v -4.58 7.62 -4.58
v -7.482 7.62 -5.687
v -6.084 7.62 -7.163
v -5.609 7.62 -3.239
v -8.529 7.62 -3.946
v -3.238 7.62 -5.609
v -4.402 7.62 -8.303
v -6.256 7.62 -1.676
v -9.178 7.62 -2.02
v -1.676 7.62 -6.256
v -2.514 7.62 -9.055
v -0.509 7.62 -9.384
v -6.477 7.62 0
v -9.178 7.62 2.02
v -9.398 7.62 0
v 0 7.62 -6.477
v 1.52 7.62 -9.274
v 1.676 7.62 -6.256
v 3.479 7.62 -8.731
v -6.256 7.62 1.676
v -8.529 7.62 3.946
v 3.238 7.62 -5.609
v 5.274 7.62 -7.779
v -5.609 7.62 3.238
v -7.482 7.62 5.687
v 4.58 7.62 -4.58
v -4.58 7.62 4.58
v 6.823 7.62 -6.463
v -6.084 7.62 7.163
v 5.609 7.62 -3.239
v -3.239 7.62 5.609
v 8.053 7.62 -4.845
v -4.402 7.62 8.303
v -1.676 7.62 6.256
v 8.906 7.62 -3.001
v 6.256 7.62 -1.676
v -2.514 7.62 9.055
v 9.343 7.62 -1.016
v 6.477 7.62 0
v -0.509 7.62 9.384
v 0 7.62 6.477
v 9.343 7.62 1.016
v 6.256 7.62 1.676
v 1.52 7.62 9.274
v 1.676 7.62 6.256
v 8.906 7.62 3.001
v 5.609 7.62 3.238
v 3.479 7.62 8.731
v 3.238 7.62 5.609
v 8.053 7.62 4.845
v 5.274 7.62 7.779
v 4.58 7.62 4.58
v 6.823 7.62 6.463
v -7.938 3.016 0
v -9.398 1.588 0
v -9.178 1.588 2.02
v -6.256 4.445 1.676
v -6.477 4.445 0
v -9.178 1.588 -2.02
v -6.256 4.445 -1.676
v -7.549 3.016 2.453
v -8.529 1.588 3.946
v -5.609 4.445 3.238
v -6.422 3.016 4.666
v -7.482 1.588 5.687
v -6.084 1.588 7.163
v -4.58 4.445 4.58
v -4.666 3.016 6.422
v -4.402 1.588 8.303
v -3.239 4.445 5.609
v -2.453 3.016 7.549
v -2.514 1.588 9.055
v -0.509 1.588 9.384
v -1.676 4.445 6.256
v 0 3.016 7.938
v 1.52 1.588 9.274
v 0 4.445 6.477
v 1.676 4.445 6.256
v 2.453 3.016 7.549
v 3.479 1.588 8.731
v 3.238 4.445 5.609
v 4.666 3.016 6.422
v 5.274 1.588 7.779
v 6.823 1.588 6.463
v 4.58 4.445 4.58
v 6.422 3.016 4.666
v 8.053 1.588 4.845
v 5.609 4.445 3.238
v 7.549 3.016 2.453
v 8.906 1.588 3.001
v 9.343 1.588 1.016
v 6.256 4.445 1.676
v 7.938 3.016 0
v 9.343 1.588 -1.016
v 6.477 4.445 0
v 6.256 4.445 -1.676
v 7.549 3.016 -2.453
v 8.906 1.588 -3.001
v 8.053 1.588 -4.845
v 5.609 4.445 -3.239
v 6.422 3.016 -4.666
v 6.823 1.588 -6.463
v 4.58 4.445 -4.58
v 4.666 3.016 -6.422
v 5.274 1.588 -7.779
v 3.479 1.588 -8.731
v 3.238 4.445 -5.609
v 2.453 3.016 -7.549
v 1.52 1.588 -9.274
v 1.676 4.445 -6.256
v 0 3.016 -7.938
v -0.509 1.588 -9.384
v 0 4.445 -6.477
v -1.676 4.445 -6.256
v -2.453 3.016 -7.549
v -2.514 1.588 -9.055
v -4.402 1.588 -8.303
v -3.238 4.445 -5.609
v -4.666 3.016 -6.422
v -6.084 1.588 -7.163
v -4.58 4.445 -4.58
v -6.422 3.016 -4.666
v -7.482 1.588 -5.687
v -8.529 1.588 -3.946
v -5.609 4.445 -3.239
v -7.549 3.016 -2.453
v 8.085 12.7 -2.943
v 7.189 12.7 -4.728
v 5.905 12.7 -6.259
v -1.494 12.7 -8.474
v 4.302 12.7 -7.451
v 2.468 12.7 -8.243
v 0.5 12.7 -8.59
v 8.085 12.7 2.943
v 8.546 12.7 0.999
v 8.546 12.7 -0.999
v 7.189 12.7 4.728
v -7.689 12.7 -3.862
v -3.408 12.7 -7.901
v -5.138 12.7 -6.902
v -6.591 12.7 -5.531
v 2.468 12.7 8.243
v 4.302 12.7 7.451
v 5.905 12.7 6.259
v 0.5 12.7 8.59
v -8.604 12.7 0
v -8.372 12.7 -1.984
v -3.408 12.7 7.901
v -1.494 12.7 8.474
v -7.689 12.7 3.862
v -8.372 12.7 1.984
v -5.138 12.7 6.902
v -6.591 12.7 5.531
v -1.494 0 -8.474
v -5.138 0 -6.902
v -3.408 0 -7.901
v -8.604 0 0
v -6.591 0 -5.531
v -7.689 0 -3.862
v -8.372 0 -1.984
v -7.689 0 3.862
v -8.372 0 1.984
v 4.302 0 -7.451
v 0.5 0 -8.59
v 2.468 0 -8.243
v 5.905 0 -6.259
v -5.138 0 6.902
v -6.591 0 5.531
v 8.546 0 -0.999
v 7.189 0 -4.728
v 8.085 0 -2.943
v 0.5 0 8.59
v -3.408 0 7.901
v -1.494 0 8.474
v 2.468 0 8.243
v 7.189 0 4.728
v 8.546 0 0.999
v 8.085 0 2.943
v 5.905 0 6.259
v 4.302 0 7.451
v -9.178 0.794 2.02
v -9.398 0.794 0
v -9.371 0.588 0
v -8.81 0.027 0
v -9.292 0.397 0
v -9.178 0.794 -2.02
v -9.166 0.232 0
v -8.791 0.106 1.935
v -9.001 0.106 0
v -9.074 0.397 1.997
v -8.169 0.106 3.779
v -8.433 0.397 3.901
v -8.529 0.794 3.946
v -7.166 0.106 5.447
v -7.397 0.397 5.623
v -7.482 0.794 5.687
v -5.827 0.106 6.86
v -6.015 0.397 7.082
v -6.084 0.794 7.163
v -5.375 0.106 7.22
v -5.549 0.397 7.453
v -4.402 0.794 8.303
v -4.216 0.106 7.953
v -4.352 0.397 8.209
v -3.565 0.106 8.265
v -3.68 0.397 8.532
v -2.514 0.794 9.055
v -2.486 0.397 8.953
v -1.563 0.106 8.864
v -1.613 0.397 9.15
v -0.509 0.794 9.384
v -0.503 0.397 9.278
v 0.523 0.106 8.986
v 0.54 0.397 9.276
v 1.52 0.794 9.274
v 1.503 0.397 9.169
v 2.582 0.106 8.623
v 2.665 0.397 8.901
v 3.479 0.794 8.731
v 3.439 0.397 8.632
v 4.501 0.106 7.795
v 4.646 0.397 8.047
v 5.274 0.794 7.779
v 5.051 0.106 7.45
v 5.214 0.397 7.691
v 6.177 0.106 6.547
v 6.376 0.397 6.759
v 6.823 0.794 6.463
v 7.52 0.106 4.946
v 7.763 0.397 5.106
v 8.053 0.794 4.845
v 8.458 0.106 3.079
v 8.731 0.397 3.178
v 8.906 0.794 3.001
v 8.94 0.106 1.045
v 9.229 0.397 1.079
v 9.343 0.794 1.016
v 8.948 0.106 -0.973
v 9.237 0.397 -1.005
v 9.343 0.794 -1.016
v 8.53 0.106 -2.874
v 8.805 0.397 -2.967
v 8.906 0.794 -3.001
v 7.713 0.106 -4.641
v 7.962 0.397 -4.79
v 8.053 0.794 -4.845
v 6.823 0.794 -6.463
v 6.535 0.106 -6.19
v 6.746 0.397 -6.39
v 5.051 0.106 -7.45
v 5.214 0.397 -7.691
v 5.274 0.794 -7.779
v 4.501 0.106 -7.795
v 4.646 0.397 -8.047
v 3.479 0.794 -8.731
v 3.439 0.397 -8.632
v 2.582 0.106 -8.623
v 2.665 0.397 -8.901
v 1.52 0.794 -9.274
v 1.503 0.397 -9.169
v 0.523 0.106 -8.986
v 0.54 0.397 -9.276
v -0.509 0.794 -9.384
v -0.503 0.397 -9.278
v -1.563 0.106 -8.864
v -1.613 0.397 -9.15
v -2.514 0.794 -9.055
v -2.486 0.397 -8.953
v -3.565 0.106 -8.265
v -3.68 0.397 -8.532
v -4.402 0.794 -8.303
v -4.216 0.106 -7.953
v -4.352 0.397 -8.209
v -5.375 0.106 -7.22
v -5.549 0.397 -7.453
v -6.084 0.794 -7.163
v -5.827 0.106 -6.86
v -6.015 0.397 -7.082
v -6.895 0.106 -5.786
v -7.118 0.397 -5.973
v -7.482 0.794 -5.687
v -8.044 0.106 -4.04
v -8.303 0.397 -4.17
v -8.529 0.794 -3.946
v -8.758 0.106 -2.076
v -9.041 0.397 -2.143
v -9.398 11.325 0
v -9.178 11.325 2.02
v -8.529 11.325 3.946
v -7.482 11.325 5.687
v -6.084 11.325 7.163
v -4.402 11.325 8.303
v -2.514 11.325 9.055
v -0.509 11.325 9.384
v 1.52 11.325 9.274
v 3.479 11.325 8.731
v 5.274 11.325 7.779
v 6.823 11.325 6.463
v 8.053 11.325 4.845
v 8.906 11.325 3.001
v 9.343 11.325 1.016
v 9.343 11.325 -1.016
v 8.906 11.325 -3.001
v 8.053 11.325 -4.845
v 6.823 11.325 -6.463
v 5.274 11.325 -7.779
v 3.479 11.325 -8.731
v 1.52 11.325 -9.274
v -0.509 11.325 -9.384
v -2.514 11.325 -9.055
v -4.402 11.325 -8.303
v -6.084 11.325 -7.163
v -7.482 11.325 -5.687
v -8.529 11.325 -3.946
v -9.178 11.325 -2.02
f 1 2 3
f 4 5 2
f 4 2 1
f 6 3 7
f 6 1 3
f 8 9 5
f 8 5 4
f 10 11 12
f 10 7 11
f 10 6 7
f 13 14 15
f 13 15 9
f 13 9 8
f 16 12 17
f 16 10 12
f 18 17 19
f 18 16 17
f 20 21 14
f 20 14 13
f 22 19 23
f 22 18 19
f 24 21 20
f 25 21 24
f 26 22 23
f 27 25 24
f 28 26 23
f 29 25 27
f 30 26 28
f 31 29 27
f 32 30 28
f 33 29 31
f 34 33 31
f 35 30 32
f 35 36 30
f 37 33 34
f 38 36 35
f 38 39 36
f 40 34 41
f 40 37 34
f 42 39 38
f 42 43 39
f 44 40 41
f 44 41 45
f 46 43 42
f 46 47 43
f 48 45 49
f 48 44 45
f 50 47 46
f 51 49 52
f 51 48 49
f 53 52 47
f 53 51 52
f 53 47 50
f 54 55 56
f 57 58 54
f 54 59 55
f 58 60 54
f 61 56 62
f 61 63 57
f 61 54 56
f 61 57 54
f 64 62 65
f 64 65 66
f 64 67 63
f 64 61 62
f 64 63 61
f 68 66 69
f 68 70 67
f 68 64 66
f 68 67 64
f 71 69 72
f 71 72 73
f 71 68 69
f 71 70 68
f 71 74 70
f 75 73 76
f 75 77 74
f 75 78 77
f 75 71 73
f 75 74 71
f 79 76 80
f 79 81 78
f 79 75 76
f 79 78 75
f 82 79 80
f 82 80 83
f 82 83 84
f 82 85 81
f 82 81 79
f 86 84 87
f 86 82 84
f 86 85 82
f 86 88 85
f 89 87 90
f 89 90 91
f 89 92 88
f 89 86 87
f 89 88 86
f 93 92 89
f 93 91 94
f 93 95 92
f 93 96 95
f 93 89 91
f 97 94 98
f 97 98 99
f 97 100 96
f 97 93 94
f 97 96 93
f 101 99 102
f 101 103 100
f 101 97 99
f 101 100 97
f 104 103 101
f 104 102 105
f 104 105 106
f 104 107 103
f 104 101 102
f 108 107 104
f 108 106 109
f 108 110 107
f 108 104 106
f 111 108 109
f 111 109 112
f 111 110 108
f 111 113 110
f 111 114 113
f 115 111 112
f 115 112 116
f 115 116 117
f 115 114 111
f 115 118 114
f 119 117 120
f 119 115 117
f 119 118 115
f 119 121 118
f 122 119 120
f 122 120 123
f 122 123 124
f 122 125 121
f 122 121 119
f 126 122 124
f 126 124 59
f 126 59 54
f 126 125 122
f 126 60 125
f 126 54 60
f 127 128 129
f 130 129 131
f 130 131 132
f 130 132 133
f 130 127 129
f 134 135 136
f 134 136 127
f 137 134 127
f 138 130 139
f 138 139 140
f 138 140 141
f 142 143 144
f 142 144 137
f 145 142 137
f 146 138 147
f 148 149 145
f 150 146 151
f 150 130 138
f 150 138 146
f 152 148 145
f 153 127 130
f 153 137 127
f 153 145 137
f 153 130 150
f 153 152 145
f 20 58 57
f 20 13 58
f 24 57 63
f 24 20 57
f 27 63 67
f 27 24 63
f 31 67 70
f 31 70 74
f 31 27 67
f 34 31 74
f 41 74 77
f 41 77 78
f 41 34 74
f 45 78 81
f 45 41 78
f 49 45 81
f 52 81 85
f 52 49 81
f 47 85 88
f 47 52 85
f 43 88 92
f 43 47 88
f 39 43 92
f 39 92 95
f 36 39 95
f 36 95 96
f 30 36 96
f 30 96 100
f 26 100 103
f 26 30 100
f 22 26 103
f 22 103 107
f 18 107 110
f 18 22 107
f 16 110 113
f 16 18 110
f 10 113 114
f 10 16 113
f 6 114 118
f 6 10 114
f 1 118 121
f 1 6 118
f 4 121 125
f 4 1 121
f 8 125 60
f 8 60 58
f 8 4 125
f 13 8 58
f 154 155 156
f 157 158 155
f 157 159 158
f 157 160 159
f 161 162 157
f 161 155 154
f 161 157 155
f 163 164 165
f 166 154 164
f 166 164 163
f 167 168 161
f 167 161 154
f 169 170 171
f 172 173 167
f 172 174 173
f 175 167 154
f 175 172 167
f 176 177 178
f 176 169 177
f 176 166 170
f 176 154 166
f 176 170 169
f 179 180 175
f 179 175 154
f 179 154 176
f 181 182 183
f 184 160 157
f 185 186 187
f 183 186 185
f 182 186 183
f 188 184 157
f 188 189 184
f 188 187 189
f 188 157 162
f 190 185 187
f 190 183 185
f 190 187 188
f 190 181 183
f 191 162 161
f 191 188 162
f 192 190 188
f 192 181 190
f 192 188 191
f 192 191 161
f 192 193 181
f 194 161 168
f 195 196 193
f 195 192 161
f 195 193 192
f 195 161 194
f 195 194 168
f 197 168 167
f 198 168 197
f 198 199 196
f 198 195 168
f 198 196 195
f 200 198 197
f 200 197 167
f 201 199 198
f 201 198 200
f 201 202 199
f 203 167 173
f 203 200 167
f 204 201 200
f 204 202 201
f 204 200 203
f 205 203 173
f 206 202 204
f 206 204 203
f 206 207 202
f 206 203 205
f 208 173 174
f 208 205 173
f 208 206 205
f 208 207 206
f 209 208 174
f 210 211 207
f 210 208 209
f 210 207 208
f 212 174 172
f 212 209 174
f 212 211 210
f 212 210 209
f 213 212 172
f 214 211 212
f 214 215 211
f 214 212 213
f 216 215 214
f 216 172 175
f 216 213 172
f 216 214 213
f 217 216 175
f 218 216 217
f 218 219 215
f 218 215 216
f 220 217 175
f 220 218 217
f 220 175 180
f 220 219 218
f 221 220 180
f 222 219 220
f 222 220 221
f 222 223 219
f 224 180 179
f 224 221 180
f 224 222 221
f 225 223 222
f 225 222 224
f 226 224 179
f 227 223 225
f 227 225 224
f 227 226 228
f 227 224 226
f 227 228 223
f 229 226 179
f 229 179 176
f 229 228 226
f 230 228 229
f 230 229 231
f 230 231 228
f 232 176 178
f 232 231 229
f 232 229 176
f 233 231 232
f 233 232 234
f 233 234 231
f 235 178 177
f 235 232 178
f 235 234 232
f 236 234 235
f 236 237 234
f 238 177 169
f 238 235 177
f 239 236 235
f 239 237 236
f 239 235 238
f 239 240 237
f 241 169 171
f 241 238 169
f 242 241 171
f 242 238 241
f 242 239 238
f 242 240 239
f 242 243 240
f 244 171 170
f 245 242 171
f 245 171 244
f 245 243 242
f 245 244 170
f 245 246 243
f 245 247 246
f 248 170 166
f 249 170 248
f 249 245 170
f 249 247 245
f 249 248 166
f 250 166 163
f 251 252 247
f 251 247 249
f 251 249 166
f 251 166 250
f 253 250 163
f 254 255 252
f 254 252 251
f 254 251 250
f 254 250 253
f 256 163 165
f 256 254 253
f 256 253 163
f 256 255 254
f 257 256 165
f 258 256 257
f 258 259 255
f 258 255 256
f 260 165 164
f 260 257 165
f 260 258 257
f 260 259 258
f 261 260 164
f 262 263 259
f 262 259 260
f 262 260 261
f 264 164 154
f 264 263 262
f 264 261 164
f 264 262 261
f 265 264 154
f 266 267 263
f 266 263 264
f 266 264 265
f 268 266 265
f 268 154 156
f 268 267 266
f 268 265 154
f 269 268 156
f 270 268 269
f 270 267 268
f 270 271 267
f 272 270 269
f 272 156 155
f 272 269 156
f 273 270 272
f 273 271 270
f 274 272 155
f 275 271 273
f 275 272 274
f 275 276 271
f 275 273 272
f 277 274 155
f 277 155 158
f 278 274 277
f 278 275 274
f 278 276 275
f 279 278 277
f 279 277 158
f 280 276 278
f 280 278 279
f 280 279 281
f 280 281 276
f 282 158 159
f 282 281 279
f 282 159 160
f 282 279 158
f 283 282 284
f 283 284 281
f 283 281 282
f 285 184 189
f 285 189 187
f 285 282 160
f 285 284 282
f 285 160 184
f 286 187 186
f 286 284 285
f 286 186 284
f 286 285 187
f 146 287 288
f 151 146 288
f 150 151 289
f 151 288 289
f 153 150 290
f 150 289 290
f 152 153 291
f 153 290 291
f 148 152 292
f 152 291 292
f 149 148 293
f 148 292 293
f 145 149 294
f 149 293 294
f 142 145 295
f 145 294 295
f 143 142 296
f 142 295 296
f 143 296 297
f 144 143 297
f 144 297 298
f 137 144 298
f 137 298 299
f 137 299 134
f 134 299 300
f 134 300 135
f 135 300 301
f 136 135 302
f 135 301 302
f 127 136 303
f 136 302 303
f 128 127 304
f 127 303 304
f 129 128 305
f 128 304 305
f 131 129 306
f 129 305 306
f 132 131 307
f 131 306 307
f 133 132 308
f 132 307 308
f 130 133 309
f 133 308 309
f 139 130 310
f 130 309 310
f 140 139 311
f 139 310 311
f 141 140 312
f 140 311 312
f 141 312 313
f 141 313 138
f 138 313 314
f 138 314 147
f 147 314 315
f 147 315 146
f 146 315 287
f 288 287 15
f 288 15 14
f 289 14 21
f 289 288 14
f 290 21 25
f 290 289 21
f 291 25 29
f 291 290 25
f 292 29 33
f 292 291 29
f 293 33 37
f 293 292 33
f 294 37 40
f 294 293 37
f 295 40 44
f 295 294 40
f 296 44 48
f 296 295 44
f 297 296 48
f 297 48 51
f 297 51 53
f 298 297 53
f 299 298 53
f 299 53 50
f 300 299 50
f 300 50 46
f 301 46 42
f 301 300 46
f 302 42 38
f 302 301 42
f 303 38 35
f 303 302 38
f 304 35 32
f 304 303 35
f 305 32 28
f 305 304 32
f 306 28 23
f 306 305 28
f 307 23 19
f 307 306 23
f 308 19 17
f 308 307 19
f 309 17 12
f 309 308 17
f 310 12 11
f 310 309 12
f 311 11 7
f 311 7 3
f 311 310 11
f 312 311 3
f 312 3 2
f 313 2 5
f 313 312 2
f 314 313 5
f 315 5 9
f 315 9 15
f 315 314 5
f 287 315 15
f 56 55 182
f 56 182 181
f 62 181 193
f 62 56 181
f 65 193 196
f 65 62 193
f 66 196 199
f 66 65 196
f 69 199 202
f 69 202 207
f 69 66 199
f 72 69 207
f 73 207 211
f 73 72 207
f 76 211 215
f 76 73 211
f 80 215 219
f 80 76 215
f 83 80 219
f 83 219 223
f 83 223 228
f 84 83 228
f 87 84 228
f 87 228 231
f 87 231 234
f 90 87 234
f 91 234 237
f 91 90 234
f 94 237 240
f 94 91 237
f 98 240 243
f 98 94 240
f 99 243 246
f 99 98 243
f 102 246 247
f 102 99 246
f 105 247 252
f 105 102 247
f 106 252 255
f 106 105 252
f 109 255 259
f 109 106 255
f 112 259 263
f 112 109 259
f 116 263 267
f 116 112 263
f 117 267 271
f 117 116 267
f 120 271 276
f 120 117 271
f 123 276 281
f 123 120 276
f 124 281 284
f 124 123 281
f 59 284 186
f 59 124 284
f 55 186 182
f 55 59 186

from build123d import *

# Parameters (mm, degrees)
FILLET1_R      = 0.79375
CHAMFER1_SIZE  = 0.79375
CHAMFER1_SIZE2 = 1.374815329


with BuildPart() as part:
    # Sketch1 → Revolve1 (revolve)
    with BuildSketch(Plane.XY):
        Polygon((0, 0), (-9.398, 0), (-9.398, 1.5875), (-6.477, 4.445), (-6.477, 7.62), (-9.398, 7.62), (-9.398, 12.7), (0, 12.7), align=None)
    revolve(axis=Axis((0, 0, 0), (0, 1, 0)))

    # Fillet1
    fillet1_edges = [part.edges().sort_by_distance(p)[0] for p in [
        (9.398, 0, 0),
    ]]
    fillet(fillet1_edges, radius=FILLET1_R)

    # Chamfer1
    chamfer1_edges = [part.edges().sort_by_distance(p)[0] for p in [
        (9.398, 12.7, 0),
    ]]
    chamfer1_side = [part.faces().sort_by_distance(p)[0] for p in [
        (0, 12.7, 0),
    ]]
    chamfer(chamfer1_edges, length=CHAMFER1_SIZE, length2=CHAMFER1_SIZE2, reference=chamfer1_side[0])


solid = part.part
